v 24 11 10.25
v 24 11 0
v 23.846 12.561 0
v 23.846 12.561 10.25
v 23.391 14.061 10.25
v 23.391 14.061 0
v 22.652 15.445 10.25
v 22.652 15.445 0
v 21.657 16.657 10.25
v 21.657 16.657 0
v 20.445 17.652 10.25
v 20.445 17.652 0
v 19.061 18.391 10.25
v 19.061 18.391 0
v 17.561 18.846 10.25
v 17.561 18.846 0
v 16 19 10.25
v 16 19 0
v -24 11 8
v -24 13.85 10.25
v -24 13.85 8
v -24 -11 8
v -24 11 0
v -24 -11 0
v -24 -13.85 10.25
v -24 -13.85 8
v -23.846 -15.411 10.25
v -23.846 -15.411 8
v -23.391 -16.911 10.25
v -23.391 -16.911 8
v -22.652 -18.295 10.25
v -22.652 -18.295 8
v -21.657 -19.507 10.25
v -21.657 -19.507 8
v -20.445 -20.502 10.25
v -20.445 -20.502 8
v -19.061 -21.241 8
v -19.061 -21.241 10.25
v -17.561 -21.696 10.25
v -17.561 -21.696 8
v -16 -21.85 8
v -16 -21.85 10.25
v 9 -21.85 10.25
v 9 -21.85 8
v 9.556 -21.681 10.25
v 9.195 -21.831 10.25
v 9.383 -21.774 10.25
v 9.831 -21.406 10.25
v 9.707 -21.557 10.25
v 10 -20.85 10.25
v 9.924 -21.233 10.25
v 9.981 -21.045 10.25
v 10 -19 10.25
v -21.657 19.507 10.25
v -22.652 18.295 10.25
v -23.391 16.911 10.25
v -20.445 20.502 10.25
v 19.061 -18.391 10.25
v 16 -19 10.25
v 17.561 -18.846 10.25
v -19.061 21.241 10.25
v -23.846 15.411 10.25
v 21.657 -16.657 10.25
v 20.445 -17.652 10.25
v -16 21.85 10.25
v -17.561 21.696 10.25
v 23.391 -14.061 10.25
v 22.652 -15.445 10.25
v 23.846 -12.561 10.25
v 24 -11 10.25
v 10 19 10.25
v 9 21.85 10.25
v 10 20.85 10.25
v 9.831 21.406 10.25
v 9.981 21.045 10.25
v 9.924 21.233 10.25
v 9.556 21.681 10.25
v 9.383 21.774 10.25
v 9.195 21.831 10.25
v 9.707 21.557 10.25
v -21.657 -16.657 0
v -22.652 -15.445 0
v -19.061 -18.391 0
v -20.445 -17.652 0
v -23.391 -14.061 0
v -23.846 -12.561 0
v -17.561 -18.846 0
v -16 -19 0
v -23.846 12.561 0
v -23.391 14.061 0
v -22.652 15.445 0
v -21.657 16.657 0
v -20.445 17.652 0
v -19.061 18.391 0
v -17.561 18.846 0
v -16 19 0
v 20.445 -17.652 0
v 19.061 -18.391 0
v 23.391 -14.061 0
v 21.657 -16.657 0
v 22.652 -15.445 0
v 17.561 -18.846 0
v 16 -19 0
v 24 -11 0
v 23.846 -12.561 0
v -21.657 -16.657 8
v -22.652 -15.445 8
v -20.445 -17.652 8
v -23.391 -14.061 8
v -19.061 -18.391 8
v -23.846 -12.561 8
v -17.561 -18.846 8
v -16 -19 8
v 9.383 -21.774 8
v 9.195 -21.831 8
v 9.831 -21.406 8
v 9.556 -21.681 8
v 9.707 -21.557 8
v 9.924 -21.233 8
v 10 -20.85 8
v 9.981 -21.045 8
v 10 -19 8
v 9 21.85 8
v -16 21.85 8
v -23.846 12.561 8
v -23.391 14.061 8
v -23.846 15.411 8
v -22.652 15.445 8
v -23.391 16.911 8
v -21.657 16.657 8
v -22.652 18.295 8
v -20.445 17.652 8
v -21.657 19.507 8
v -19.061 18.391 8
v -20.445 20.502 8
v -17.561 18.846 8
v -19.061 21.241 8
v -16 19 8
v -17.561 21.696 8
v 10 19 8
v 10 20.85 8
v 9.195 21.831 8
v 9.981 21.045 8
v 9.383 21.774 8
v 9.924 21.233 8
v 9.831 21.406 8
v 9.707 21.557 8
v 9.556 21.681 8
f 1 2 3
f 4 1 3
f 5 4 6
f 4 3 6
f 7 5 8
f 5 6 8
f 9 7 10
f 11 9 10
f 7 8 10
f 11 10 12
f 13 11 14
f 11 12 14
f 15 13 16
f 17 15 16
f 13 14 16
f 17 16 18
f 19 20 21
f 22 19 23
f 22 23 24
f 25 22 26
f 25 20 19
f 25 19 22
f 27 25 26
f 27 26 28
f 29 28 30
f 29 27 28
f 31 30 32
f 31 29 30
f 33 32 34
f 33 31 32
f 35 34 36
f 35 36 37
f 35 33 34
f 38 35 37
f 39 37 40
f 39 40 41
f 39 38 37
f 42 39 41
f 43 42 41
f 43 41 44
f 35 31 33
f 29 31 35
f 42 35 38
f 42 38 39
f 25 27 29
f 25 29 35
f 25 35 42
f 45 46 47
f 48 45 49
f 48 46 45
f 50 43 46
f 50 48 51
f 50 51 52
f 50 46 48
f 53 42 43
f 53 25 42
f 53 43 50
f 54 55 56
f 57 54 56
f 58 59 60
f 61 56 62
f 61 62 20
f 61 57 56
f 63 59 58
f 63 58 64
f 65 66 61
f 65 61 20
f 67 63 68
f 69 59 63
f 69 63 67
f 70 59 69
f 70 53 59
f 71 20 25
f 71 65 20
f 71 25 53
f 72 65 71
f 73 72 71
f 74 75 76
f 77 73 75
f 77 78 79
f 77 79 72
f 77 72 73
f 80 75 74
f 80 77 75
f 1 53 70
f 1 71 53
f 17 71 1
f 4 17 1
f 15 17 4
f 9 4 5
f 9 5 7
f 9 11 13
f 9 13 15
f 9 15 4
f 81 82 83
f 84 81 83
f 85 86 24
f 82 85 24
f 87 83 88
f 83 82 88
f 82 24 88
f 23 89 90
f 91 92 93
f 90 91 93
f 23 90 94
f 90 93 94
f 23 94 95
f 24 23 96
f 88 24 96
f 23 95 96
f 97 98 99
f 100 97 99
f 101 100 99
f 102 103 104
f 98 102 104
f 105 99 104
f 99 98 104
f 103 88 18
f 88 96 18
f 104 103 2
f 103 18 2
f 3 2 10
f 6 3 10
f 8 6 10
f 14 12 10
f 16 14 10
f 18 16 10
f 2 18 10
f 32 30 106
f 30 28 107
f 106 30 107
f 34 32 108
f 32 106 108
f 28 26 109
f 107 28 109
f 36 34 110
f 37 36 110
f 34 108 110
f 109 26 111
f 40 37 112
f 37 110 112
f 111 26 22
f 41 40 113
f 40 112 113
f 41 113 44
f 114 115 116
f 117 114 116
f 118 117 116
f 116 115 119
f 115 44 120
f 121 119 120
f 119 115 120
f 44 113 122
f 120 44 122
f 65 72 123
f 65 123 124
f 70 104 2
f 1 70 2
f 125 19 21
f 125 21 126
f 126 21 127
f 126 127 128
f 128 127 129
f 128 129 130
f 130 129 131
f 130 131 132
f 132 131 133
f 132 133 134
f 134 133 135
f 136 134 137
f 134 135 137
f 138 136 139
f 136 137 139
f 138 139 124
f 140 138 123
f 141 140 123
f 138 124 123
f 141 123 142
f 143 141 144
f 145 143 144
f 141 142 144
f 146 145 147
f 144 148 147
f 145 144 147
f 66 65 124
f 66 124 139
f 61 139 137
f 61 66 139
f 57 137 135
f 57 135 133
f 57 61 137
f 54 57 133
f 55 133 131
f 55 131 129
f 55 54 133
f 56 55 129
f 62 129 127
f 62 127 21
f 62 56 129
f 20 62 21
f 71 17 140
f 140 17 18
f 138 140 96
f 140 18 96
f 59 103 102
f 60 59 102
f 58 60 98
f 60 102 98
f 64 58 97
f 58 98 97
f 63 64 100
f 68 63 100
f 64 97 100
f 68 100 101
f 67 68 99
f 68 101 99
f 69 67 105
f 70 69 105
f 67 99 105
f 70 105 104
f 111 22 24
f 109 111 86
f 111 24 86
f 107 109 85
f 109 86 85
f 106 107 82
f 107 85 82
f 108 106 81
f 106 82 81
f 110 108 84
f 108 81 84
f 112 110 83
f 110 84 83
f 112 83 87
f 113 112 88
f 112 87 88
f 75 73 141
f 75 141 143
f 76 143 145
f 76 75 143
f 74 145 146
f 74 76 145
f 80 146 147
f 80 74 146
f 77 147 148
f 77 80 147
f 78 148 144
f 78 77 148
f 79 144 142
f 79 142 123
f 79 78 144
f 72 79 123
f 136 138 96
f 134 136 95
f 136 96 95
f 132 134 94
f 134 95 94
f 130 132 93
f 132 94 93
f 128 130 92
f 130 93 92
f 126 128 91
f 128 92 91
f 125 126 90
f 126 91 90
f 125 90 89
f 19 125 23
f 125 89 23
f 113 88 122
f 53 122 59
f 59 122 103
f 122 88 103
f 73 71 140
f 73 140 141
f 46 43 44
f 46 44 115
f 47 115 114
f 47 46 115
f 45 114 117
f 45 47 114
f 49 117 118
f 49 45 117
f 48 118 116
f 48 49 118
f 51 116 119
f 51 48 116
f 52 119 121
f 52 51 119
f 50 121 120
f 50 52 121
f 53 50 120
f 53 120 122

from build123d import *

# Parameters (mm, degrees)
F1_DEPTH = 10.25
F3_DEPTH = 2.25


with BuildPart() as f1:
    # F0 (on Top) → F1 (new body)
    with BuildSketch(Plane.XY):
        with BuildLine():
            Line((-16, -19), (16, -19))
            ThreePointArc((16, -19), (21.656854, -16.656854), (24, -11))
            Line((24, -11), (24, 11))
            ThreePointArc((24, 11), (21.656854, 16.656854), (16, 19))
            Line((16, 19), (-16, 19))
            ThreePointArc((-16, 19), (-21.656854, 16.656854), (-24, 11))
            Line((-24, 11), (-24, -11))
            ThreePointArc((-24, -11), (-21.656854, -16.656854), (-16, -19))
        make_face()
    extrude(amount=F1_DEPTH)

    # F2 (on face) → F3 (join)
    with BuildSketch(Plane.XY.offset(10.25)):
        with BuildLine():
            Line((9, 21.85), (-16, 21.85))
            ThreePointArc((-16, 21.85), (-21.656854, 19.506854), (-24, 13.85))
            Line((-24, 13.85), (-24, 11))
            ThreePointArc((-24, 11), (-21.656854, 16.656854), (-16, 19))
            Line((-16, 19), (10, 19))
            Line((10, 19), (10, 20.85))
            ThreePointArc((10, 20.85), (9.707107, 21.557107), (9, 21.85))
        make_face()
        with BuildLine():
            ThreePointArc((-16, -19), (-21.656854, -16.656854), (-24, -11))
            Line((-24, -11), (-24, -13.85))
            ThreePointArc((-24, -13.85), (-21.656854, -19.506854), (-16, -21.85))
            Line((-16, -21.85), (9, -21.85))
            ThreePointArc((9, -21.85), (9.707107, -21.557107), (10, -20.85))
            Line((10, -20.85), (10, -19))
            Line((10, -19), (-16, -19))
        make_face()
        with BuildLine():
            ThreePointArc((-16, 19), (-21.656854, 16.656854), (-24, 11))
            Line((-24, 11), (-24, -11))
            ThreePointArc((-24, -11), (-21.656854, -16.656854), (-16, -19))
            Line((-16, -19), (10, -19))
            Line((10, -19), (10, 19))
            Line((10, 19), (-16, 19))
        make_face()
    extrude(amount=-F3_DEPTH)


solid = f1.part
